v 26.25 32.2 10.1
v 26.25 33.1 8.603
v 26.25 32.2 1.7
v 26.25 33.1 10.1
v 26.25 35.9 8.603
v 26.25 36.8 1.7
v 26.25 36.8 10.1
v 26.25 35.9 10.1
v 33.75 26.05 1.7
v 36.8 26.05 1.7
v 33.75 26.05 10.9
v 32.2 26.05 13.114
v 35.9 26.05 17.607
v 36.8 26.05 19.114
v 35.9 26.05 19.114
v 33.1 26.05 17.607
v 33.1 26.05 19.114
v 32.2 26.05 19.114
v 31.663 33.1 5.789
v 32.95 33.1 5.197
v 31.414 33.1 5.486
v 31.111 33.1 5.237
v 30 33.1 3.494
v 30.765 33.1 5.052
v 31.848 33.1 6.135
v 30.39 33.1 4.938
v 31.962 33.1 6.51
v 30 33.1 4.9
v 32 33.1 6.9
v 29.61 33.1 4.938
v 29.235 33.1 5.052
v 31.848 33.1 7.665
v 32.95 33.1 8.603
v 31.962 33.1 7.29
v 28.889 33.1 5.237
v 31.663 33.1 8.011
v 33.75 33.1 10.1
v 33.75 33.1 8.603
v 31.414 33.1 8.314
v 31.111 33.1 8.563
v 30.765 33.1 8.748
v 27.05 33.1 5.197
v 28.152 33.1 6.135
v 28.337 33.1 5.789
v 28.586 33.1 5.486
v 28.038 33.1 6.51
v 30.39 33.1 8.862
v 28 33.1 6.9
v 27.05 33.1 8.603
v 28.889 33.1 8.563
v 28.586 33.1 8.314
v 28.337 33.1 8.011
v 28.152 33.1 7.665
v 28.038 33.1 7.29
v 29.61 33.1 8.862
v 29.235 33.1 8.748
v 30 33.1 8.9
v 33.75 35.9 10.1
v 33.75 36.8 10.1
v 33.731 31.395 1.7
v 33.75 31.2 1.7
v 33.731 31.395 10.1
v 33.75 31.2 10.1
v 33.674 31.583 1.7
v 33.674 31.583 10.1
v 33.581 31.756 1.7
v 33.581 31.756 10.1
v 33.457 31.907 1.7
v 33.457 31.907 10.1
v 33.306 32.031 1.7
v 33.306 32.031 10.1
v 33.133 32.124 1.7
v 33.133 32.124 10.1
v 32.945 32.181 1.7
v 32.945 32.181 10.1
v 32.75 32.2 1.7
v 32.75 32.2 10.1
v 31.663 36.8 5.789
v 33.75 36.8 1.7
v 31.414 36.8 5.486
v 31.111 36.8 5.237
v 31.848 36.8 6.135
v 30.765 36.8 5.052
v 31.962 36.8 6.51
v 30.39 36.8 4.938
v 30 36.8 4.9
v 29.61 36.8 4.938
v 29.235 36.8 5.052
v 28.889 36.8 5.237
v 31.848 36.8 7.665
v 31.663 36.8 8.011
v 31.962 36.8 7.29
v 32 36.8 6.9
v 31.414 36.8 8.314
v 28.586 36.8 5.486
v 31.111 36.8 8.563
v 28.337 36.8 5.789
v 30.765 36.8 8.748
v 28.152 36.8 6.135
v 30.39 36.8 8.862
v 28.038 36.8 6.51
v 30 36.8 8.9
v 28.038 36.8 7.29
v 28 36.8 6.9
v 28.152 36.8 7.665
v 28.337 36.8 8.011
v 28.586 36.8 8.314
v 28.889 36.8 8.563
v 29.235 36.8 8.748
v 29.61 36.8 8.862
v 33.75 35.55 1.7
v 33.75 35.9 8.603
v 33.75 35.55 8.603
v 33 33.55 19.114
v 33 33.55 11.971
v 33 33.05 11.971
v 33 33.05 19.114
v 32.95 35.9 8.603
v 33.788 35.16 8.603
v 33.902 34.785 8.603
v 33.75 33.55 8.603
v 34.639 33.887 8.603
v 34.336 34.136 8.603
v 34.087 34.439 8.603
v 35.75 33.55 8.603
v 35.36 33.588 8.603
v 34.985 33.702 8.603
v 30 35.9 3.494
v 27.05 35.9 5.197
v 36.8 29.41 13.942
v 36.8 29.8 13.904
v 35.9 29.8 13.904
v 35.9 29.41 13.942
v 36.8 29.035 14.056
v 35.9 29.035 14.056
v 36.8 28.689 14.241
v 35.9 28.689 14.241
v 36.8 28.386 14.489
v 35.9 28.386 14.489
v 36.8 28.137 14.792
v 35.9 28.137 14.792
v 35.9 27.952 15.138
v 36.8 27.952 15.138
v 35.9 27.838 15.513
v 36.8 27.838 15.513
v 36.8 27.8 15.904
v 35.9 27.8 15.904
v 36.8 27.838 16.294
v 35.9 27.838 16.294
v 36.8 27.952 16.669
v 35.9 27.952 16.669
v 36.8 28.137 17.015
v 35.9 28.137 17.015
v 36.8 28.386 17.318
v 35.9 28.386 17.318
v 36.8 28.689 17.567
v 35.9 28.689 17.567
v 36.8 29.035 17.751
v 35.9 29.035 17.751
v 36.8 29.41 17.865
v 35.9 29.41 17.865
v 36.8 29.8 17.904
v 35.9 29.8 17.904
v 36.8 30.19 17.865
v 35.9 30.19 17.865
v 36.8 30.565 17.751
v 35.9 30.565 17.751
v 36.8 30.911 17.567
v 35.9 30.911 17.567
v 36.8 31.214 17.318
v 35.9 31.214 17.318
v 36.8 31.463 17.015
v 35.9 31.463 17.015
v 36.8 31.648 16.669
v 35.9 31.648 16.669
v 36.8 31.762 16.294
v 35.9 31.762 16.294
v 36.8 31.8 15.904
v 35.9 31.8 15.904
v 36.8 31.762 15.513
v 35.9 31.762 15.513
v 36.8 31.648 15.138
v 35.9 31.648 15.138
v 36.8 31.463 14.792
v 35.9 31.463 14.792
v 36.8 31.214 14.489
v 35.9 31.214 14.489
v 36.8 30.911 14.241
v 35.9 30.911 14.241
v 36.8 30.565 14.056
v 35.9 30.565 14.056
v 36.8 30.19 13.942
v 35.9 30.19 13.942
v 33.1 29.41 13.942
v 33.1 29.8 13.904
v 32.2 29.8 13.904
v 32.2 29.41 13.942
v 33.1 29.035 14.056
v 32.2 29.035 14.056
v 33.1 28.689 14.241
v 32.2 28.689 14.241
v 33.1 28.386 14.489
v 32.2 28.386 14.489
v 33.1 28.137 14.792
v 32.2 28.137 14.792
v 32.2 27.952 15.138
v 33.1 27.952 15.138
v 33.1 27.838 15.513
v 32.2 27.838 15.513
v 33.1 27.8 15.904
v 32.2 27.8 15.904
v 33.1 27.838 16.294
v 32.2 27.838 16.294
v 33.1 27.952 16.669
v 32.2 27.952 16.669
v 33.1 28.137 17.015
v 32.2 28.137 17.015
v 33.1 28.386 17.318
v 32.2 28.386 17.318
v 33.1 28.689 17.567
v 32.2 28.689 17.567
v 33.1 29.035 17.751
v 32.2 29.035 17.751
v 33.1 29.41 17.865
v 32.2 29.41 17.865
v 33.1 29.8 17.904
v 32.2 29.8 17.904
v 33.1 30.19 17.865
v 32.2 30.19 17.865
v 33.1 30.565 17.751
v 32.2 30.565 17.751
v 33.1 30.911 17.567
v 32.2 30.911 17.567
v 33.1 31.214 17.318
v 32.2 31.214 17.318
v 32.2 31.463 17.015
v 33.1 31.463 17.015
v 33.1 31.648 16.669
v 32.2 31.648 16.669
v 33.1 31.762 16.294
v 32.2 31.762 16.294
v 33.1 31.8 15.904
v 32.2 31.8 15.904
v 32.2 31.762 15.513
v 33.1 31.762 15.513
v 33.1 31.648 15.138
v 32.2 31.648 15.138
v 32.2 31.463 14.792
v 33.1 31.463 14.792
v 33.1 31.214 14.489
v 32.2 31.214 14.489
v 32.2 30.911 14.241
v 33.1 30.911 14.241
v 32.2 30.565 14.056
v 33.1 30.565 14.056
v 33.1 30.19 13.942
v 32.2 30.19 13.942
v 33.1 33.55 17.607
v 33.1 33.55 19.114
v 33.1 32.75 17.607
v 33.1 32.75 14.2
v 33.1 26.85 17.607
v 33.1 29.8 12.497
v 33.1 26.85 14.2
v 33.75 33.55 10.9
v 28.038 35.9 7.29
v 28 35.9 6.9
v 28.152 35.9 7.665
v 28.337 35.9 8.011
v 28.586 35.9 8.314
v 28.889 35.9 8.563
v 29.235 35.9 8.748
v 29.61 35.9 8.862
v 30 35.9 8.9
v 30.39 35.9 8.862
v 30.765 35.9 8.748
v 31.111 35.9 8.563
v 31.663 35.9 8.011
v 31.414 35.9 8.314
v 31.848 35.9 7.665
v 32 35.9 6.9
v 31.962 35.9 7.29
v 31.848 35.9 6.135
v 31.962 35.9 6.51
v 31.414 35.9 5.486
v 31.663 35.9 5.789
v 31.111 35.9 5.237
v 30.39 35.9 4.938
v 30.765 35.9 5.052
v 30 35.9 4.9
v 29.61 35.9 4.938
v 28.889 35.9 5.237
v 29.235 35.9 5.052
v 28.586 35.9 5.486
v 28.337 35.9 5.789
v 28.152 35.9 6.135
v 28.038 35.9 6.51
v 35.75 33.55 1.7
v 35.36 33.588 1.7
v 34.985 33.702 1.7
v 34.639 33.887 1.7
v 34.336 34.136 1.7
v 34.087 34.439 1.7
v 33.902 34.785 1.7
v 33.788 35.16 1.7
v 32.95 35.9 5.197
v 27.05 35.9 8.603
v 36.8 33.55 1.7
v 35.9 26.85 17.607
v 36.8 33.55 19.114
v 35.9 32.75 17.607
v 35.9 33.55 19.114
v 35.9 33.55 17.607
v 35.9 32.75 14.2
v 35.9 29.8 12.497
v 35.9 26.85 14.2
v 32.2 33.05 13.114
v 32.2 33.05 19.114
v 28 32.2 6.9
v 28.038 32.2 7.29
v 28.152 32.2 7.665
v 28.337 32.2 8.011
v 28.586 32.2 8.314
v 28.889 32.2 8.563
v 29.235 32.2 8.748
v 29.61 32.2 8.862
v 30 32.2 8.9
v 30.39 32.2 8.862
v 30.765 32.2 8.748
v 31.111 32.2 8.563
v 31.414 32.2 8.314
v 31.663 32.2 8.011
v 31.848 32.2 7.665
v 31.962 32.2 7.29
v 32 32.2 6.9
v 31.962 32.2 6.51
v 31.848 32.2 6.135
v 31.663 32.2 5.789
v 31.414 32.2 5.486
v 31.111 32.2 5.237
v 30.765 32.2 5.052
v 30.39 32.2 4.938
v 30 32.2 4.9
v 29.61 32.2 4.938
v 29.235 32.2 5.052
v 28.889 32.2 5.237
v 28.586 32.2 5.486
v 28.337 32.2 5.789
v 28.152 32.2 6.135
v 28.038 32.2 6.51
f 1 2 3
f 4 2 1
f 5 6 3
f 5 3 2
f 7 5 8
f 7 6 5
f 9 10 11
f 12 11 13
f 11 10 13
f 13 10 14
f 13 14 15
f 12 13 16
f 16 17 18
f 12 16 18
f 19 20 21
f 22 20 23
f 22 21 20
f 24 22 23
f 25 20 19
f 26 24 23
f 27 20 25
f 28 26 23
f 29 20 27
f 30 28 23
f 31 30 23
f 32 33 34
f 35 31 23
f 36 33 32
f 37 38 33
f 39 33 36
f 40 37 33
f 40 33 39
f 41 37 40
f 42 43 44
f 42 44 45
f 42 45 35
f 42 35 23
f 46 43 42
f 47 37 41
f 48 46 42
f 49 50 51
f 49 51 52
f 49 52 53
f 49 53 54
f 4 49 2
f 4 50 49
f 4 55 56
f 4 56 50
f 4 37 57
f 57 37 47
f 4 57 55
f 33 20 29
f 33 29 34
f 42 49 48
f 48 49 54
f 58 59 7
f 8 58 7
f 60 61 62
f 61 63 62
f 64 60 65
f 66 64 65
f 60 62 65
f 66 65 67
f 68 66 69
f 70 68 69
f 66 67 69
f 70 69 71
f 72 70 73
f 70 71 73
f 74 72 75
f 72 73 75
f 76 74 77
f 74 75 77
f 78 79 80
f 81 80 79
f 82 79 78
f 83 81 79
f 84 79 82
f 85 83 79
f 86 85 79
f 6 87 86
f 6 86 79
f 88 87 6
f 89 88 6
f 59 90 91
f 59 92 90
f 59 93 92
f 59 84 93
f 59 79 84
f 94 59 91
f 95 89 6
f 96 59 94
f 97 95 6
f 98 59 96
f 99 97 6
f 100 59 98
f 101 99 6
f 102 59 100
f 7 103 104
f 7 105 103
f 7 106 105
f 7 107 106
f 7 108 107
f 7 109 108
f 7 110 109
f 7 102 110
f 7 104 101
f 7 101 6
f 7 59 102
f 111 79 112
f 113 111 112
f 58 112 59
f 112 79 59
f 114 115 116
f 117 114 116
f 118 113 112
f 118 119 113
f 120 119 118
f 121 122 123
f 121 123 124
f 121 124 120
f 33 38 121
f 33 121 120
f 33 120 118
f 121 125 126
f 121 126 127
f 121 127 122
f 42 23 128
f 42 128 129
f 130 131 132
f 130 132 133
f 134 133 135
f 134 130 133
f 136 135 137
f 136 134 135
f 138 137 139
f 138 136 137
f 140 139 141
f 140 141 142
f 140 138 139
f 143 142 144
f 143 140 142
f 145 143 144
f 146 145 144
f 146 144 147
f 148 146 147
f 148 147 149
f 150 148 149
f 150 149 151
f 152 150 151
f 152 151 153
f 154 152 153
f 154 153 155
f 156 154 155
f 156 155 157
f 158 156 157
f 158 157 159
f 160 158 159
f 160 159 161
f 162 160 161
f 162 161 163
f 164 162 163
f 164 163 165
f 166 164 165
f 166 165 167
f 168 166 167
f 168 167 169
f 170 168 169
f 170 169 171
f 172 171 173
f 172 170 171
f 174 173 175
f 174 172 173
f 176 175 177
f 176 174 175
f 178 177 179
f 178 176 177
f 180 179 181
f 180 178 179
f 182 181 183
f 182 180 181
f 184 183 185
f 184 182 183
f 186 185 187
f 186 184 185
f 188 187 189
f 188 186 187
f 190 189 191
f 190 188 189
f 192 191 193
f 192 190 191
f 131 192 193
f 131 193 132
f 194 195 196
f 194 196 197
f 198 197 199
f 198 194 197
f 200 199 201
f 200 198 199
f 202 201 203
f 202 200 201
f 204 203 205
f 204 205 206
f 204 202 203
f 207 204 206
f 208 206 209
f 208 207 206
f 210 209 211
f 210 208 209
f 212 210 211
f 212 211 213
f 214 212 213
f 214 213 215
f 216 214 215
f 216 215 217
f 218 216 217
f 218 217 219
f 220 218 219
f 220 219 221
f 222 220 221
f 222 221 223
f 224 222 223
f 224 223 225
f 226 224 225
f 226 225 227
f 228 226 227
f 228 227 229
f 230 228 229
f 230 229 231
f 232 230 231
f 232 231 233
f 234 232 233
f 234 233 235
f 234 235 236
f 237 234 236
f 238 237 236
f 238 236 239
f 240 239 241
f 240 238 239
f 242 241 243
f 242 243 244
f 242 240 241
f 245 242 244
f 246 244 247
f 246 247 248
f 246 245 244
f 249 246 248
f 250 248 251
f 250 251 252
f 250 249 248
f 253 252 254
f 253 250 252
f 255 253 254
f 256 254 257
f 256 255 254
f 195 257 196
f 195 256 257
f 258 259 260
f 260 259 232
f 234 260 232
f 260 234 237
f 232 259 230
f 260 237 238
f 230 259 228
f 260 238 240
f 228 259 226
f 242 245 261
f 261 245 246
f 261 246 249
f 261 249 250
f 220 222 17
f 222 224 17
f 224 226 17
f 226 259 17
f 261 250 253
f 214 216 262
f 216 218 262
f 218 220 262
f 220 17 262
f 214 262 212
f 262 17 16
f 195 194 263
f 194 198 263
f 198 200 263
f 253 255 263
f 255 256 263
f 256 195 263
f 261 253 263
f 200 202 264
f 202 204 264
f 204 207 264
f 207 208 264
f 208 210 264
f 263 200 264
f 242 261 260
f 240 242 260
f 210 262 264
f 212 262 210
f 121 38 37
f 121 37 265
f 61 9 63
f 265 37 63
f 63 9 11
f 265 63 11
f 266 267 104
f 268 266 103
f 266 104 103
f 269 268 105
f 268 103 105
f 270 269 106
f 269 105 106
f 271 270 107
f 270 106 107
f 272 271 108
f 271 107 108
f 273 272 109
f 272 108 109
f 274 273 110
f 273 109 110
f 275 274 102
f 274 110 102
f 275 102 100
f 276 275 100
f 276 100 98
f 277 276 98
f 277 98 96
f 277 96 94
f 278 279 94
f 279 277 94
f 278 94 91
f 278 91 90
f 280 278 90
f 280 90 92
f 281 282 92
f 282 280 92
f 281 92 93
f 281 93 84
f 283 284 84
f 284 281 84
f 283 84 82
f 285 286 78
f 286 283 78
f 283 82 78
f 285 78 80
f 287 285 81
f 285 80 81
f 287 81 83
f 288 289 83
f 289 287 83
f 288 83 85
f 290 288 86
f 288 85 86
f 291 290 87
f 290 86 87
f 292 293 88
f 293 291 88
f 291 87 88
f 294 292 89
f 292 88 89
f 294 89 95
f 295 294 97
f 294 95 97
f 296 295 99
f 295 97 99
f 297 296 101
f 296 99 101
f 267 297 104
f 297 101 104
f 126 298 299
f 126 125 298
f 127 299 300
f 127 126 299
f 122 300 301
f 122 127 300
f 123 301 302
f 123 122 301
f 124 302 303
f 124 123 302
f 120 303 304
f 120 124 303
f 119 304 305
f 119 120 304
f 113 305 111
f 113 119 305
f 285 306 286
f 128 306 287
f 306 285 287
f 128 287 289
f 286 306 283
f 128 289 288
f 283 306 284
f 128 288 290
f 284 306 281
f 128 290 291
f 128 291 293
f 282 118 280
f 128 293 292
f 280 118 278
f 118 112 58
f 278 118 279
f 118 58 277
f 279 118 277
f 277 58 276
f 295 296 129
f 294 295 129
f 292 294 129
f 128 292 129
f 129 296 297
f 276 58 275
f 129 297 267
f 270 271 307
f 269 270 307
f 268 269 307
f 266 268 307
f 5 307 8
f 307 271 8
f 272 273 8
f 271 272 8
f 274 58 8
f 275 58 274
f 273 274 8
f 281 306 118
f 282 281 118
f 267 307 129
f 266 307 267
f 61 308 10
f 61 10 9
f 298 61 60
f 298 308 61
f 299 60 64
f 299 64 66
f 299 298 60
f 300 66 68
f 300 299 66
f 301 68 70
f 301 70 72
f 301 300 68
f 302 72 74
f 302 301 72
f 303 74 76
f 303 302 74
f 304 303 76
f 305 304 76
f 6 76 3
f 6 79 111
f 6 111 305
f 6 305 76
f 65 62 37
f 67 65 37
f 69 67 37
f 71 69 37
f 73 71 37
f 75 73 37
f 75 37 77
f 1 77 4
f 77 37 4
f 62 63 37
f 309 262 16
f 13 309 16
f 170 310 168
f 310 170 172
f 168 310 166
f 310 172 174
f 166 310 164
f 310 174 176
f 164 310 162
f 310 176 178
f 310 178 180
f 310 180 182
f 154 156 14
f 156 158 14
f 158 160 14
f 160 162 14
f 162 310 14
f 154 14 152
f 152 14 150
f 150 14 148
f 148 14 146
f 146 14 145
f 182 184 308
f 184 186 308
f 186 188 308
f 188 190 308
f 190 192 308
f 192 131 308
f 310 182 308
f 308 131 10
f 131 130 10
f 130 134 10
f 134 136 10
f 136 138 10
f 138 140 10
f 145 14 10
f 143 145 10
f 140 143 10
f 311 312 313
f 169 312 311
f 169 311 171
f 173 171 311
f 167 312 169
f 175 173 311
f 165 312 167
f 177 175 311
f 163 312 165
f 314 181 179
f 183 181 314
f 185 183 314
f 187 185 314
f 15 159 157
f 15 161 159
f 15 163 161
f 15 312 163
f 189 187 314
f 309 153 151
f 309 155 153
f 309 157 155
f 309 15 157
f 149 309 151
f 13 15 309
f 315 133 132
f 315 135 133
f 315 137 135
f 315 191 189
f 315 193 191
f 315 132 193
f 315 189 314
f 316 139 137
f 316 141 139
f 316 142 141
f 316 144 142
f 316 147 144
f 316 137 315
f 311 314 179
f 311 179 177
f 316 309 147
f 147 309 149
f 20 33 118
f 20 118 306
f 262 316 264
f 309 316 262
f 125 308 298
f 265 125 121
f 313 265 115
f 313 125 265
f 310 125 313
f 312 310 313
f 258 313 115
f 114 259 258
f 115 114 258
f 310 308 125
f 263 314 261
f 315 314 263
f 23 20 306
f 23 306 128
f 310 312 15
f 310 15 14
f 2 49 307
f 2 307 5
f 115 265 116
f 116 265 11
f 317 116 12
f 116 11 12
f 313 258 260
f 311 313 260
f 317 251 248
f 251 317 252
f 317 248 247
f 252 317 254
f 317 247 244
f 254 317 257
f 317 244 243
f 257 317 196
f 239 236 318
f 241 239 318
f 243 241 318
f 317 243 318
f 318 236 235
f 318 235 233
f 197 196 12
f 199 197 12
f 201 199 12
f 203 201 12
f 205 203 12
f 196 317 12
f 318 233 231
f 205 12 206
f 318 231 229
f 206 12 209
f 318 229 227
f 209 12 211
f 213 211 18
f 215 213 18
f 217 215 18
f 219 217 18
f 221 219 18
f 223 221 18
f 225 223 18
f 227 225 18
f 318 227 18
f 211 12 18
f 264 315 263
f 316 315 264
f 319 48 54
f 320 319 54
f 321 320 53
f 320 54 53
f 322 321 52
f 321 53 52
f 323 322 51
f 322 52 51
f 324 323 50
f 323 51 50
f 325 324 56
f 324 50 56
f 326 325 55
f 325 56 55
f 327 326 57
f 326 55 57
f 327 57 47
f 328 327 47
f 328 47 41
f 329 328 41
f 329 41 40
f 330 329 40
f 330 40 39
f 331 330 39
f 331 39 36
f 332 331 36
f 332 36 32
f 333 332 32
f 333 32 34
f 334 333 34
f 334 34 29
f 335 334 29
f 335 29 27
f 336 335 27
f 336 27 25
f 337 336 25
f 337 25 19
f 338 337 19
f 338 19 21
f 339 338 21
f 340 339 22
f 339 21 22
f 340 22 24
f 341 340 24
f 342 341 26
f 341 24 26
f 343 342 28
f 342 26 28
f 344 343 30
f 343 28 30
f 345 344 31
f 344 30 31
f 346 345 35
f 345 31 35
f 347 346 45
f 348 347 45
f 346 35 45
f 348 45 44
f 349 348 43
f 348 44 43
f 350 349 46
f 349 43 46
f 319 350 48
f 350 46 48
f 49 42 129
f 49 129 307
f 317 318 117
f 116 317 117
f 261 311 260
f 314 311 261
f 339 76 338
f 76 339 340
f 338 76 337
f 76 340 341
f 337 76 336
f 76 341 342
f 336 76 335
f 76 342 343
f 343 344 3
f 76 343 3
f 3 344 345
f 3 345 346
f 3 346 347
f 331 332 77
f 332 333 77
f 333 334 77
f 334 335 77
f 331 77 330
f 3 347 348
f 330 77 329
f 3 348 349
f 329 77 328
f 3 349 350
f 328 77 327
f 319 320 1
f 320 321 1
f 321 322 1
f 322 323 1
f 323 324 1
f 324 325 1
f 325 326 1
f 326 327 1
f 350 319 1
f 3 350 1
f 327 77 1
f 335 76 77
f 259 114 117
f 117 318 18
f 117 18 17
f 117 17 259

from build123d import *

# Parameters (mm, degrees)
SKETCH046_W       = 7.5
SKETCH046_H       = 8.4
SKETCH046_R       = 2
PAD028_DEPTH      = 4.6
POCKET013_START   = -0.9
POCKET013_DEPTH   = 2.8
PAD029_DEPTH      = 6.15
PAD029_DEPTH_BACK = 1.35
SKETCH049_R       = 2
POCKET014_DEPTH   = 10.551
POCKET015_START   = -0.9
POCKET015_DEPTH   = 2.8
SKETCH051_W       = 0.8
SKETCH051_H       = 0.5
POCKET016_DEPTH   = 8
FILLET008_R       = 1
FILLET009_R       = 2


with BuildPart() as f_3dp_angle_bracket_bottom:
    # Sketch046 → Pad028 (new body)
    with BuildSketch(Plane.XZ):
        with Locations((0, -1)):
            Rectangle(SKETCH046_W, SKETCH046_H)
        Circle(SKETCH046_R, mode=Mode.SUBTRACT)
    extrude(amount=PAD028_DEPTH)

    # Sketch047 (on Face7 of Pad028) → Pocket013 (cut)
    with BuildSketch(Plane.XZ.offset(4.6).offset(POCKET013_START)):
        Polygon((2.95, 1.703183), (3.75, 1.703183), (3.75, 3.2), (-3.75, 3.2), (-3.75, 1.703183), (-2.95, 1.703183), (-2.95, -1.703183), (0, -3.406367), (2.95, -1.703183), align=None)
    extrude(amount=-POCKET013_DEPTH, mode=Mode.SUBTRACT)

    # Sketch048 (on Face8 of Pocket013) → Pad029 (join, two sides)
    with BuildSketch(Plane.XZ.offset(4.6)) as pad029_sk:
        Polygon((-3.75, -5.2), (-3.75, 3.2), (-3.75, 4), (-2.2, 6.213629), (-2.2, 12.213629), (-6.8, 12.213629), (-6.8, -5.2), align=None)
    extrude(amount=PAD029_DEPTH)
    extrude(pad029_sk.sketch, amount=-PAD029_DEPTH_BACK)

    # Sketch049 (on Face26 of Pad029) → Pocket014 (cut, through all)
    with BuildSketch(Plane(origin=(-6.8, 0, 0), x_dir=(0, 0, -1), z_dir=(-1, 0, 0))):
        with Locations((-9.003629, 7)):
            Circle(SKETCH049_R)
    extrude(amount=-POCKET014_DEPTH, mode=Mode.SUBTRACT)

    # Sketch050 (on Face26 of Pocket014) → Pocket015 (cut)
    with BuildSketch(Plane(origin=(-6.8, 0, 0), x_dir=(0, 0, -1), z_dir=(-1, 0, 0)).offset(POCKET015_START)):
        Polygon((-10.706813, 9.95), (-10.706813, 10.75), (-12.213629, 10.75), (-12.213629, 3.25), (-10.706813, 3.25), (-10.706813, 4.05), (-7.300446, 4.05), (-5.597263, 7), (-7.300446, 9.95), align=None)
    extrude(amount=-POCKET015_DEPTH, mode=Mode.SUBTRACT)

    # Sketch051 (on Face25 of Pocket015) → Pocket016 (cut)
    with BuildSketch(Plane(origin=(0, 0, 12.213629), x_dir=(-1, 0, 0), z_dir=(0, 0, 1))):
        with Locations((2.6, 3.5)):
            Rectangle(SKETCH051_W, SKETCH051_H)
    extrude(amount=-POCKET016_DEPTH, mode=Mode.SUBTRACT)

    # Fillet008
    fillet008_edges = [f_3dp_angle_bracket_bottom.edges().sort_by_distance(p)[0] for p in [
        (-3.75, -4.6, -1),
    ]]
    fillet(fillet008_edges, radius=FILLET008_R)

    # Fillet009
    fillet009_edges = [f_3dp_angle_bracket_bottom.edges().sort_by_distance(p)[0] for p in [
        (-3.75, -3.25, -1.748408),
    ]]
    fillet(fillet009_edges, radius=FILLET009_R)


with BuildPart() as f_3dp_angle_bracket_bottom_1:
    # Body027 placement: moved
    add(f_3dp_angle_bracket_bottom.part.moved(Location((-30, 36.8, 6.9))))


with BuildPart() as part_mirroring:
    # Part__Mirroring: instance of 3DP_Angle_bracket_Bottom
    add(f_3dp_angle_bracket_bottom_1.part.mirror(Plane(origin=(0, 0, 0), x_dir=(0, -1, 0), z_dir=(1, 0, 0))))


solid = part_mirroring.part
